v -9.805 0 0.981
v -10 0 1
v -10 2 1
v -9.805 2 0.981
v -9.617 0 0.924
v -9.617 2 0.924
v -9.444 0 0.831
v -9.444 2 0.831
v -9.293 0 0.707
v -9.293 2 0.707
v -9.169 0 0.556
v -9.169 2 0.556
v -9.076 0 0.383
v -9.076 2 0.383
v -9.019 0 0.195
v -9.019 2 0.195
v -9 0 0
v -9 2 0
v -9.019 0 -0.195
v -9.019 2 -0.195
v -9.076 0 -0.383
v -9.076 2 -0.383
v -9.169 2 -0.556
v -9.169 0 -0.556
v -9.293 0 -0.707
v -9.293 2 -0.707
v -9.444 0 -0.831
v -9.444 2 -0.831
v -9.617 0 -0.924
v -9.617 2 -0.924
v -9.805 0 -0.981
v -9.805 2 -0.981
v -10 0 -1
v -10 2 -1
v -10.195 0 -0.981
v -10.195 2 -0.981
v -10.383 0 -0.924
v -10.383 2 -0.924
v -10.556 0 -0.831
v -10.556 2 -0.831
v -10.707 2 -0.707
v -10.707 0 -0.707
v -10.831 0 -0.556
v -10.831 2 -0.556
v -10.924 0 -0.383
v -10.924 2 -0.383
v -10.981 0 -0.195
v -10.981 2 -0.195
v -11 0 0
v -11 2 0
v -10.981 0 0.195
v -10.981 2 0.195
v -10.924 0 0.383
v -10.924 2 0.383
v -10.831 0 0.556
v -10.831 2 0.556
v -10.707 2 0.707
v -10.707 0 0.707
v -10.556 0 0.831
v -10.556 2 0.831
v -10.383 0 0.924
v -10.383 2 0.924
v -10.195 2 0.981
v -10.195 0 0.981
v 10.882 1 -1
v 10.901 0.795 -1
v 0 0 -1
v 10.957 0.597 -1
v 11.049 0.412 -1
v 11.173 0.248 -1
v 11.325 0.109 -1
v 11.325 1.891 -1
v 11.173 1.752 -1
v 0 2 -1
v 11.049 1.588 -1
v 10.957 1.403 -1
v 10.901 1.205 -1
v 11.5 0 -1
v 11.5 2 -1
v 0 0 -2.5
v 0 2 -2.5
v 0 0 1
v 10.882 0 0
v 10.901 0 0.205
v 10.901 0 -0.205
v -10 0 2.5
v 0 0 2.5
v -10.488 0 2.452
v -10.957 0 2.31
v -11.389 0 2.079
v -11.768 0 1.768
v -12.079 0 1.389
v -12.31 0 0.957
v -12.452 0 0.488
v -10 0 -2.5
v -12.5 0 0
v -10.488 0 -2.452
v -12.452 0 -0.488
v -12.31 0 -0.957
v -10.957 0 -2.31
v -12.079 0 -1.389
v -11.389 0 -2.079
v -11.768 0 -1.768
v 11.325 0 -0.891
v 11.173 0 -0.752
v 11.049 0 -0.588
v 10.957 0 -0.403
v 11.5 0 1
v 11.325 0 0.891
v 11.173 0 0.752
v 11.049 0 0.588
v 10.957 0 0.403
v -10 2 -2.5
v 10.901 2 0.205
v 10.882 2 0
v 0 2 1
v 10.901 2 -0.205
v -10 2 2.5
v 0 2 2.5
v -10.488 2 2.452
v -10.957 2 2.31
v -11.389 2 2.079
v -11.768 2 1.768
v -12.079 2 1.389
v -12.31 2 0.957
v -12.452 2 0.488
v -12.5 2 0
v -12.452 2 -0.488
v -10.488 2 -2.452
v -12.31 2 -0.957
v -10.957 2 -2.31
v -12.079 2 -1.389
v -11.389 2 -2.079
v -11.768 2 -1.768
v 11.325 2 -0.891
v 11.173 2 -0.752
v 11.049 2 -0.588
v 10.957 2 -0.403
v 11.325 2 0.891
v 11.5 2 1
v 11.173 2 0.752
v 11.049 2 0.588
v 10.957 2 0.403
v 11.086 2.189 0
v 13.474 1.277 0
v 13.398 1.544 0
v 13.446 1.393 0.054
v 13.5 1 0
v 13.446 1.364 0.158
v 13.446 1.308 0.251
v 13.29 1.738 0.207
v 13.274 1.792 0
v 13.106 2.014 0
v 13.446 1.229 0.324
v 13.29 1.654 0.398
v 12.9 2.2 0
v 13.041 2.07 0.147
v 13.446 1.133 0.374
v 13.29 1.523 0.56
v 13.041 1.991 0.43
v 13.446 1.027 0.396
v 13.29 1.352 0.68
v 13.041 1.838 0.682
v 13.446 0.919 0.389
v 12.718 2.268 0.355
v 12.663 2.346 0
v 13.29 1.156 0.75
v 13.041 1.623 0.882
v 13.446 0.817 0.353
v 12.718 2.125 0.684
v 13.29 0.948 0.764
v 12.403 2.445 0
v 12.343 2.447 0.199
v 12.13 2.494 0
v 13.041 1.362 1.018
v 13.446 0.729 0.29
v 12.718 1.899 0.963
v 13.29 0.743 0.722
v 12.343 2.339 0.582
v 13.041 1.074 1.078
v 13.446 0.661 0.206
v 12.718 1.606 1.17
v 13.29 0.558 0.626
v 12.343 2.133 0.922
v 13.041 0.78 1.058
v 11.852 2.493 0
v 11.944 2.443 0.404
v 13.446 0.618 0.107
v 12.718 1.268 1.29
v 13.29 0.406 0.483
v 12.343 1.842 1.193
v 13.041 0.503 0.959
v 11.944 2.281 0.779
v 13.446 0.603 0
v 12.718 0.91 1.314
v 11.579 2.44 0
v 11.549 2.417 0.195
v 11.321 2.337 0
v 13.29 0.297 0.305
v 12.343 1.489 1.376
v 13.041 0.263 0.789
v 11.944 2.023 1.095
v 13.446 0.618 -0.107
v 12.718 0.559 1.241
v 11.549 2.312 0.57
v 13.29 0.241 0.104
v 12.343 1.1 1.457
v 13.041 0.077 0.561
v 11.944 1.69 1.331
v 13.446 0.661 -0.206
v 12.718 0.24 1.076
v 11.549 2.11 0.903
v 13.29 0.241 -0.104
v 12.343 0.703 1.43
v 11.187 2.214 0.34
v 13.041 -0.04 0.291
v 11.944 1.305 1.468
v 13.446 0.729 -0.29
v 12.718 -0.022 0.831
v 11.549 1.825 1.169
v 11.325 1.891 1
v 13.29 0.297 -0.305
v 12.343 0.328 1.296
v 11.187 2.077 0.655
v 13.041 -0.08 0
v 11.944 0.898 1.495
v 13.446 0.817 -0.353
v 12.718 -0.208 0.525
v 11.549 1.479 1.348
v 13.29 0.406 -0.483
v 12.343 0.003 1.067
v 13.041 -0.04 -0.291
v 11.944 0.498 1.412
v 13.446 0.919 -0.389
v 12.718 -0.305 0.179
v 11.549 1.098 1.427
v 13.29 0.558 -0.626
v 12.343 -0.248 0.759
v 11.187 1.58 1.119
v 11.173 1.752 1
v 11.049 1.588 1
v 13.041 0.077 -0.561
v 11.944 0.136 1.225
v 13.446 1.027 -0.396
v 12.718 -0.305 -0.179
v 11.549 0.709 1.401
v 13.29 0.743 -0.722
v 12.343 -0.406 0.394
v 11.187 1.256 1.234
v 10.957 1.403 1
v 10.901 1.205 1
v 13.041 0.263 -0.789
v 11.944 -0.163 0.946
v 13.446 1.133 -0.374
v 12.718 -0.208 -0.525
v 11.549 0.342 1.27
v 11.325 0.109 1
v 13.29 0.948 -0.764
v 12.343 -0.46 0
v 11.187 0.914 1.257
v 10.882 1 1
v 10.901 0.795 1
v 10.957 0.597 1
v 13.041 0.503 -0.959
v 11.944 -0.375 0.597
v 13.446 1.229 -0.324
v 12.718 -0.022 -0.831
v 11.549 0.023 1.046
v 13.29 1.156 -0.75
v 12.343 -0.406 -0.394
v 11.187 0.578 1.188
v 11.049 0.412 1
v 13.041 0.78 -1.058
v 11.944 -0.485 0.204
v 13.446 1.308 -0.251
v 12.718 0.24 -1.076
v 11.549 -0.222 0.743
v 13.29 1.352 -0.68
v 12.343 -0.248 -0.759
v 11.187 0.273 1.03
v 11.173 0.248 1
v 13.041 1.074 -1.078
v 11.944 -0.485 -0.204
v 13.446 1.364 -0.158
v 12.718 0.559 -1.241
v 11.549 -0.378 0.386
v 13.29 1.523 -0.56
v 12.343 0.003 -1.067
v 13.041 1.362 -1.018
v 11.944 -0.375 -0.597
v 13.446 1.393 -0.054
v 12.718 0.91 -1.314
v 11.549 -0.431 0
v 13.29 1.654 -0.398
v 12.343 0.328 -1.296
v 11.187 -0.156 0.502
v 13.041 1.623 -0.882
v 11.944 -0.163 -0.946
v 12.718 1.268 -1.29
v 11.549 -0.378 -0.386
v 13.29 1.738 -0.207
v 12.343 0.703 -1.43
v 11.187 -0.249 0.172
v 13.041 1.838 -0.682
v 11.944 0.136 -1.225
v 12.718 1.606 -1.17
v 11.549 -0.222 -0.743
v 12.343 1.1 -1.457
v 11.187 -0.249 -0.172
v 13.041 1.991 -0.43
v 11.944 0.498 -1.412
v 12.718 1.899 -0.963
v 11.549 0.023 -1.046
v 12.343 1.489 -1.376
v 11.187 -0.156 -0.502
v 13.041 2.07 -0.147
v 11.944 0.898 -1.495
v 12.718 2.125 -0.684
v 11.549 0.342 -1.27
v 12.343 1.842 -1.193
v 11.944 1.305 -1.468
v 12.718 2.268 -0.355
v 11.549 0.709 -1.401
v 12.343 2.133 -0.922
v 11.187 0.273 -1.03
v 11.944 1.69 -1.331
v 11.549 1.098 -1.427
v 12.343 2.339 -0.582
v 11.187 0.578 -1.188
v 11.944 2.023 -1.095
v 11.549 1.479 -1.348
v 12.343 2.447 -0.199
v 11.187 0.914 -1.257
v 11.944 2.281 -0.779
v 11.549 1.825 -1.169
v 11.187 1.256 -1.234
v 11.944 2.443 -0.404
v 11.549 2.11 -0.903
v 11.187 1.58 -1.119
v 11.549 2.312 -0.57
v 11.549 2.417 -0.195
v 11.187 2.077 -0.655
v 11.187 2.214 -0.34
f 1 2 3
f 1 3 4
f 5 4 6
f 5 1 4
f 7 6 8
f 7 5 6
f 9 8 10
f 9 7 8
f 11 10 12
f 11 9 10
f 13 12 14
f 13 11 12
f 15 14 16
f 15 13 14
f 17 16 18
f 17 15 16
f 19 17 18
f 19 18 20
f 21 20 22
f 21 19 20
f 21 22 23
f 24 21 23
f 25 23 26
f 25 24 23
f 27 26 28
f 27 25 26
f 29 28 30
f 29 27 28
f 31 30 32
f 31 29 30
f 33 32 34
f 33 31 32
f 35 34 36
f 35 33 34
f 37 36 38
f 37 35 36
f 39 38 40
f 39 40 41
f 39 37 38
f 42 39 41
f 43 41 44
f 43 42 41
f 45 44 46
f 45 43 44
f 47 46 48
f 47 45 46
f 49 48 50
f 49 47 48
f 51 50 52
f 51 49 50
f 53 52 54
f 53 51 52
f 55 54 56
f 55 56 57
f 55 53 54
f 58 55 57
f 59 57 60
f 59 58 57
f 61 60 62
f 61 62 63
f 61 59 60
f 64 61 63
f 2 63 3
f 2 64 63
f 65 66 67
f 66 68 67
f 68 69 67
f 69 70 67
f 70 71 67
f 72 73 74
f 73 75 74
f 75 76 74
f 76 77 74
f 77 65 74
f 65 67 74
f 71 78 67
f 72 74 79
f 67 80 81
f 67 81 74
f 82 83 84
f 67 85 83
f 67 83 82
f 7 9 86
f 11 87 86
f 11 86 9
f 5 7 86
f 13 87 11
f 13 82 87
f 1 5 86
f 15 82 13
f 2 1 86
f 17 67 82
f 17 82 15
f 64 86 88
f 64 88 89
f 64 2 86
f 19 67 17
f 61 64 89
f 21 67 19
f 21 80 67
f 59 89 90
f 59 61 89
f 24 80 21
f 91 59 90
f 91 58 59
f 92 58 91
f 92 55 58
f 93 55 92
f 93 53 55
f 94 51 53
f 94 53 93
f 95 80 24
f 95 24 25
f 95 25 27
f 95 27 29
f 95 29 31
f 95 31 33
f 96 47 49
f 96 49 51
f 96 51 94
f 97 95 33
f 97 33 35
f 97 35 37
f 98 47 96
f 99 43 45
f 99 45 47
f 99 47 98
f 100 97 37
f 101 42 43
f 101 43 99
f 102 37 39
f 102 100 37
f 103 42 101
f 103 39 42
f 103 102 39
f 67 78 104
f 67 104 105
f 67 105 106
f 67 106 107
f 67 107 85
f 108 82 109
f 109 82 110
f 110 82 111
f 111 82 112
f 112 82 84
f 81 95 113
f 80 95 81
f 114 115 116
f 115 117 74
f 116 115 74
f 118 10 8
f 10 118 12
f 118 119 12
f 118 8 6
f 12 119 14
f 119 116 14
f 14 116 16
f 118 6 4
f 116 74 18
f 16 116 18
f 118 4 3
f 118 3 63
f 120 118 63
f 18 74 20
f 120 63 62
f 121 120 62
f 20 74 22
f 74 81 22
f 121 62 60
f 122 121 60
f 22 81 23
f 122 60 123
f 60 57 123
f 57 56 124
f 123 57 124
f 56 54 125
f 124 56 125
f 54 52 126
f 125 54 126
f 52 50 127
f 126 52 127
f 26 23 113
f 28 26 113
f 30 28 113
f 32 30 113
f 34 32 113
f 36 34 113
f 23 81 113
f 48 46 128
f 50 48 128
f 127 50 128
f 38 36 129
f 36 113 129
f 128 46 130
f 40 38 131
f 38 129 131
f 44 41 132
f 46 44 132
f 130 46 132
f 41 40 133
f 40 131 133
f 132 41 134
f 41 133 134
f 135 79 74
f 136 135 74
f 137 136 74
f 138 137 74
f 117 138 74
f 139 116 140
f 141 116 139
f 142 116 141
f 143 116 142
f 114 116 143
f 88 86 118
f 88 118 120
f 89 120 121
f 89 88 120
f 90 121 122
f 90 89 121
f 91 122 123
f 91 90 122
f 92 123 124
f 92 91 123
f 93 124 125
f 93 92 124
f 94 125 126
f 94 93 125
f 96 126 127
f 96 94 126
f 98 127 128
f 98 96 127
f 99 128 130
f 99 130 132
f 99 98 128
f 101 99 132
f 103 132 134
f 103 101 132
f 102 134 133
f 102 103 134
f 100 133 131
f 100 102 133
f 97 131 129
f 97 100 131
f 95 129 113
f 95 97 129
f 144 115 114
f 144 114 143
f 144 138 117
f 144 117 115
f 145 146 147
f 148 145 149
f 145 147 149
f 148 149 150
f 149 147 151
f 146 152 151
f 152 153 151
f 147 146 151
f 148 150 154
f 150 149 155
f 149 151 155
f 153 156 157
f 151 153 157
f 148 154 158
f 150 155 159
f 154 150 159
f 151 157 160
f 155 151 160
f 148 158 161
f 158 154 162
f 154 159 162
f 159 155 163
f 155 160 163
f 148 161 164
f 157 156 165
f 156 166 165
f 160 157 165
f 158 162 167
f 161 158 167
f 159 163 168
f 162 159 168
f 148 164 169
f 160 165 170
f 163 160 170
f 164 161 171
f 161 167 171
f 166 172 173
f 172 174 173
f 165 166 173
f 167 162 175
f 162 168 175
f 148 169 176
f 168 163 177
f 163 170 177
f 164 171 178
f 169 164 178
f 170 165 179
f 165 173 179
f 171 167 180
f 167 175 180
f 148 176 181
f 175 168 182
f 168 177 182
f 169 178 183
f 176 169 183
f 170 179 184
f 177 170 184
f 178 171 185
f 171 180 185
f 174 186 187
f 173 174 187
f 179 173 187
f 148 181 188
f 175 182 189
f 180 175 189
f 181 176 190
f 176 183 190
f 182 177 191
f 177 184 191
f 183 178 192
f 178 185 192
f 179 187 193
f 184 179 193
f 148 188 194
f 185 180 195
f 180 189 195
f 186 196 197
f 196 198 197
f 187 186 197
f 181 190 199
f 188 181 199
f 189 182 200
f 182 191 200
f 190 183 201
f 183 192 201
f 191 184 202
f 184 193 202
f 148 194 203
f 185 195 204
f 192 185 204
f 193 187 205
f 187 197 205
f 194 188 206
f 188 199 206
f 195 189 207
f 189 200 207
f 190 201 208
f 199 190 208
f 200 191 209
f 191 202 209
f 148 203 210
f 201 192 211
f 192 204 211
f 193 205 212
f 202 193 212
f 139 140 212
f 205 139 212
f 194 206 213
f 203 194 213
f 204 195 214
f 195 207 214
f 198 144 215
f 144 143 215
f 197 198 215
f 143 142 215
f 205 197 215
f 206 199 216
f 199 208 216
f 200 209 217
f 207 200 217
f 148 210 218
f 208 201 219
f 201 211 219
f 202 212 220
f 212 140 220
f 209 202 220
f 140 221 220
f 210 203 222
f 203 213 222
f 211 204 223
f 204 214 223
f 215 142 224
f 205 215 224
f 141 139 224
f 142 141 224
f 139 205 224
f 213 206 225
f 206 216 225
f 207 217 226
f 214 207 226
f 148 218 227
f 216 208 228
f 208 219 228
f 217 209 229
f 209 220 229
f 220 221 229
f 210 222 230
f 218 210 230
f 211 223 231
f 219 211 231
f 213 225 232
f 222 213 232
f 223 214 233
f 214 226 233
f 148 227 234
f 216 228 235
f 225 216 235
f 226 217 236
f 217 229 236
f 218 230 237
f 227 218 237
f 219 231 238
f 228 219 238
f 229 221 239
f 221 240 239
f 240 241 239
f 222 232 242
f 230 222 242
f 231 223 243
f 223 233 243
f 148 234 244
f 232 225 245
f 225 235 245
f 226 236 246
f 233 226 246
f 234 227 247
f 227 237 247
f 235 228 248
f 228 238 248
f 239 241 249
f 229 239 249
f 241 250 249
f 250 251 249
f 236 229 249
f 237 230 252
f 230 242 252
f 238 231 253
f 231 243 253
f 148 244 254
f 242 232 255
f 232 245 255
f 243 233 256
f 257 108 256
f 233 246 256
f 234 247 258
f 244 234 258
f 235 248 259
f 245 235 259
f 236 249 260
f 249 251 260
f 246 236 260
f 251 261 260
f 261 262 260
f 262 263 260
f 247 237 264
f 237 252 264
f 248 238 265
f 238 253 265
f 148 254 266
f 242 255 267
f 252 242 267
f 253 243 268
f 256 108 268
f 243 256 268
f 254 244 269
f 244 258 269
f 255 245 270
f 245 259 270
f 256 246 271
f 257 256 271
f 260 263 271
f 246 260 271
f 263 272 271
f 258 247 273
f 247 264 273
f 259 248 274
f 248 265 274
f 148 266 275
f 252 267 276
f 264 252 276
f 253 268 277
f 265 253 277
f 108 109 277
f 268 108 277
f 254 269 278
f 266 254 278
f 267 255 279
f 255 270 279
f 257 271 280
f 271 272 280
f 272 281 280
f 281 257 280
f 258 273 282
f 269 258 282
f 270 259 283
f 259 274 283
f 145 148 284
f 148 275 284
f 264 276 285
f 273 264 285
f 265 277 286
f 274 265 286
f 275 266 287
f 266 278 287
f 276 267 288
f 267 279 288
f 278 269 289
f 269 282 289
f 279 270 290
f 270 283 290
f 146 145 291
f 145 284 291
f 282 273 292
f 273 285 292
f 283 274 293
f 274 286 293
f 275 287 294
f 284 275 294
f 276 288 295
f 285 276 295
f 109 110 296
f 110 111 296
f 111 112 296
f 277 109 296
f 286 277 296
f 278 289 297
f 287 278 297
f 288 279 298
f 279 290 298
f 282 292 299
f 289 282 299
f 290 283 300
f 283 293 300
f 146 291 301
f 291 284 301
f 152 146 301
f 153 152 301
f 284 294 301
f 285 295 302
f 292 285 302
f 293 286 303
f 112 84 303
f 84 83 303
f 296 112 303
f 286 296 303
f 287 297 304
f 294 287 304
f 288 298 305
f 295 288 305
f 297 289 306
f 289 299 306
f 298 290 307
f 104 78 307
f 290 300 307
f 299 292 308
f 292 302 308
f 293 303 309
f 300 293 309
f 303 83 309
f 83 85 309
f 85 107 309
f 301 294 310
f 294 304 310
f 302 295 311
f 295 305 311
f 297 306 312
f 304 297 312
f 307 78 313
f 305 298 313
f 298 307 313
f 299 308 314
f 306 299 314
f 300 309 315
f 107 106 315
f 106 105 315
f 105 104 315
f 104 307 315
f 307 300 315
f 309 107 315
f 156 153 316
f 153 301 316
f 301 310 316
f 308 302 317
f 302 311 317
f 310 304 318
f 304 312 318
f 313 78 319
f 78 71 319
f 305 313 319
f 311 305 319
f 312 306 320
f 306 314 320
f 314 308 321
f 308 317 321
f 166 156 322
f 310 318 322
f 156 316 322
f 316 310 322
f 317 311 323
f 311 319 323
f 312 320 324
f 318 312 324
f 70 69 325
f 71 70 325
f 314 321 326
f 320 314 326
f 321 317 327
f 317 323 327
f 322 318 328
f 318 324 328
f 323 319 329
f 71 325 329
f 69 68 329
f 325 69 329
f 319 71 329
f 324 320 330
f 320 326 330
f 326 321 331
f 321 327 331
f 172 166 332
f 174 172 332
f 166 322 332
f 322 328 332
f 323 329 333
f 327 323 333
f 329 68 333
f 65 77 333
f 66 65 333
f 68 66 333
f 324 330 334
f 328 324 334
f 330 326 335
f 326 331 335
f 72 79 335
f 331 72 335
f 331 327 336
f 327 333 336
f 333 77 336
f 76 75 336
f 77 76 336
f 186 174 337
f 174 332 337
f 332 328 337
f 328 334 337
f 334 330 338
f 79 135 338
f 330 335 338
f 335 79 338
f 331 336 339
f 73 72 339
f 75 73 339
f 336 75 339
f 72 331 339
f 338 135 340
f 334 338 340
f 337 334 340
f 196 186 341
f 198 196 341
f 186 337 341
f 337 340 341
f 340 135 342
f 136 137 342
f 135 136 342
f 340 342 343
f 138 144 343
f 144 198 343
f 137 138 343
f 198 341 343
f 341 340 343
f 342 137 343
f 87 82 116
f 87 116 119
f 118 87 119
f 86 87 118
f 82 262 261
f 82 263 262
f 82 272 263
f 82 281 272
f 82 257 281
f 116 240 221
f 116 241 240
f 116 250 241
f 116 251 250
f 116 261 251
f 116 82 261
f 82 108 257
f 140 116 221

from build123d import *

# Parameters (mm, degrees)
SKETCH1_R           = 1
BOSS_EXTRUDE1_DEPTH = 2
SKETCH4_W           = 2
SKETCH4_H           = 2
BOSS_EXTRUDE2_DEPTH = 12


with BuildPart() as part:
    # Sketch1 → Boss-Extrude1 (new body)
    with BuildSketch(Plane(origin=(0, 0, 0), x_dir=(1, 0, 0), z_dir=(0, 1, 0))):
        with BuildLine():
            Line((-10, 2.5), (0, 2.5))
            Line((0, 2.5), (0, -2.5))
            Line((0, -2.5), (-10, -2.5))
            ThreePointArc((-10, -2.5), (-12.5, 0), (-10, 2.5))
        make_face()
        with Locations(Location((-10, 0, 0), (0, 0, 270))):
            Circle(SKETCH1_R, mode=Mode.SUBTRACT)
    extrude(amount=BOSS_EXTRUDE1_DEPTH)

    # Sketch4 → Boss-Extrude2 (add)
    with BuildSketch(Plane(origin=(0, 0, 0), x_dir=(0, 0, -1), z_dir=(1, 0, 0))):
        with Locations((0, 1)):
            Rectangle(SKETCH4_W, SKETCH4_H)
    extrude(amount=BOSS_EXTRUDE2_DEPTH)

    # Sketch5 → Revolve1 (revolve)
    with BuildSketch(Plane.XY):
        with BuildLine():
            Line((10.614180701, 1.574025149), (12, 1))
            Line((12, 1), (13.5, 1))
            ThreePointArc((13.5, 1), (12.292635483, 2.471177921), (10.614180701, 1.574025149))
        make_face()
    revolve(axis=Axis((0.012505213, 1, 0), (1, 0, 0)))


solid = part.part
